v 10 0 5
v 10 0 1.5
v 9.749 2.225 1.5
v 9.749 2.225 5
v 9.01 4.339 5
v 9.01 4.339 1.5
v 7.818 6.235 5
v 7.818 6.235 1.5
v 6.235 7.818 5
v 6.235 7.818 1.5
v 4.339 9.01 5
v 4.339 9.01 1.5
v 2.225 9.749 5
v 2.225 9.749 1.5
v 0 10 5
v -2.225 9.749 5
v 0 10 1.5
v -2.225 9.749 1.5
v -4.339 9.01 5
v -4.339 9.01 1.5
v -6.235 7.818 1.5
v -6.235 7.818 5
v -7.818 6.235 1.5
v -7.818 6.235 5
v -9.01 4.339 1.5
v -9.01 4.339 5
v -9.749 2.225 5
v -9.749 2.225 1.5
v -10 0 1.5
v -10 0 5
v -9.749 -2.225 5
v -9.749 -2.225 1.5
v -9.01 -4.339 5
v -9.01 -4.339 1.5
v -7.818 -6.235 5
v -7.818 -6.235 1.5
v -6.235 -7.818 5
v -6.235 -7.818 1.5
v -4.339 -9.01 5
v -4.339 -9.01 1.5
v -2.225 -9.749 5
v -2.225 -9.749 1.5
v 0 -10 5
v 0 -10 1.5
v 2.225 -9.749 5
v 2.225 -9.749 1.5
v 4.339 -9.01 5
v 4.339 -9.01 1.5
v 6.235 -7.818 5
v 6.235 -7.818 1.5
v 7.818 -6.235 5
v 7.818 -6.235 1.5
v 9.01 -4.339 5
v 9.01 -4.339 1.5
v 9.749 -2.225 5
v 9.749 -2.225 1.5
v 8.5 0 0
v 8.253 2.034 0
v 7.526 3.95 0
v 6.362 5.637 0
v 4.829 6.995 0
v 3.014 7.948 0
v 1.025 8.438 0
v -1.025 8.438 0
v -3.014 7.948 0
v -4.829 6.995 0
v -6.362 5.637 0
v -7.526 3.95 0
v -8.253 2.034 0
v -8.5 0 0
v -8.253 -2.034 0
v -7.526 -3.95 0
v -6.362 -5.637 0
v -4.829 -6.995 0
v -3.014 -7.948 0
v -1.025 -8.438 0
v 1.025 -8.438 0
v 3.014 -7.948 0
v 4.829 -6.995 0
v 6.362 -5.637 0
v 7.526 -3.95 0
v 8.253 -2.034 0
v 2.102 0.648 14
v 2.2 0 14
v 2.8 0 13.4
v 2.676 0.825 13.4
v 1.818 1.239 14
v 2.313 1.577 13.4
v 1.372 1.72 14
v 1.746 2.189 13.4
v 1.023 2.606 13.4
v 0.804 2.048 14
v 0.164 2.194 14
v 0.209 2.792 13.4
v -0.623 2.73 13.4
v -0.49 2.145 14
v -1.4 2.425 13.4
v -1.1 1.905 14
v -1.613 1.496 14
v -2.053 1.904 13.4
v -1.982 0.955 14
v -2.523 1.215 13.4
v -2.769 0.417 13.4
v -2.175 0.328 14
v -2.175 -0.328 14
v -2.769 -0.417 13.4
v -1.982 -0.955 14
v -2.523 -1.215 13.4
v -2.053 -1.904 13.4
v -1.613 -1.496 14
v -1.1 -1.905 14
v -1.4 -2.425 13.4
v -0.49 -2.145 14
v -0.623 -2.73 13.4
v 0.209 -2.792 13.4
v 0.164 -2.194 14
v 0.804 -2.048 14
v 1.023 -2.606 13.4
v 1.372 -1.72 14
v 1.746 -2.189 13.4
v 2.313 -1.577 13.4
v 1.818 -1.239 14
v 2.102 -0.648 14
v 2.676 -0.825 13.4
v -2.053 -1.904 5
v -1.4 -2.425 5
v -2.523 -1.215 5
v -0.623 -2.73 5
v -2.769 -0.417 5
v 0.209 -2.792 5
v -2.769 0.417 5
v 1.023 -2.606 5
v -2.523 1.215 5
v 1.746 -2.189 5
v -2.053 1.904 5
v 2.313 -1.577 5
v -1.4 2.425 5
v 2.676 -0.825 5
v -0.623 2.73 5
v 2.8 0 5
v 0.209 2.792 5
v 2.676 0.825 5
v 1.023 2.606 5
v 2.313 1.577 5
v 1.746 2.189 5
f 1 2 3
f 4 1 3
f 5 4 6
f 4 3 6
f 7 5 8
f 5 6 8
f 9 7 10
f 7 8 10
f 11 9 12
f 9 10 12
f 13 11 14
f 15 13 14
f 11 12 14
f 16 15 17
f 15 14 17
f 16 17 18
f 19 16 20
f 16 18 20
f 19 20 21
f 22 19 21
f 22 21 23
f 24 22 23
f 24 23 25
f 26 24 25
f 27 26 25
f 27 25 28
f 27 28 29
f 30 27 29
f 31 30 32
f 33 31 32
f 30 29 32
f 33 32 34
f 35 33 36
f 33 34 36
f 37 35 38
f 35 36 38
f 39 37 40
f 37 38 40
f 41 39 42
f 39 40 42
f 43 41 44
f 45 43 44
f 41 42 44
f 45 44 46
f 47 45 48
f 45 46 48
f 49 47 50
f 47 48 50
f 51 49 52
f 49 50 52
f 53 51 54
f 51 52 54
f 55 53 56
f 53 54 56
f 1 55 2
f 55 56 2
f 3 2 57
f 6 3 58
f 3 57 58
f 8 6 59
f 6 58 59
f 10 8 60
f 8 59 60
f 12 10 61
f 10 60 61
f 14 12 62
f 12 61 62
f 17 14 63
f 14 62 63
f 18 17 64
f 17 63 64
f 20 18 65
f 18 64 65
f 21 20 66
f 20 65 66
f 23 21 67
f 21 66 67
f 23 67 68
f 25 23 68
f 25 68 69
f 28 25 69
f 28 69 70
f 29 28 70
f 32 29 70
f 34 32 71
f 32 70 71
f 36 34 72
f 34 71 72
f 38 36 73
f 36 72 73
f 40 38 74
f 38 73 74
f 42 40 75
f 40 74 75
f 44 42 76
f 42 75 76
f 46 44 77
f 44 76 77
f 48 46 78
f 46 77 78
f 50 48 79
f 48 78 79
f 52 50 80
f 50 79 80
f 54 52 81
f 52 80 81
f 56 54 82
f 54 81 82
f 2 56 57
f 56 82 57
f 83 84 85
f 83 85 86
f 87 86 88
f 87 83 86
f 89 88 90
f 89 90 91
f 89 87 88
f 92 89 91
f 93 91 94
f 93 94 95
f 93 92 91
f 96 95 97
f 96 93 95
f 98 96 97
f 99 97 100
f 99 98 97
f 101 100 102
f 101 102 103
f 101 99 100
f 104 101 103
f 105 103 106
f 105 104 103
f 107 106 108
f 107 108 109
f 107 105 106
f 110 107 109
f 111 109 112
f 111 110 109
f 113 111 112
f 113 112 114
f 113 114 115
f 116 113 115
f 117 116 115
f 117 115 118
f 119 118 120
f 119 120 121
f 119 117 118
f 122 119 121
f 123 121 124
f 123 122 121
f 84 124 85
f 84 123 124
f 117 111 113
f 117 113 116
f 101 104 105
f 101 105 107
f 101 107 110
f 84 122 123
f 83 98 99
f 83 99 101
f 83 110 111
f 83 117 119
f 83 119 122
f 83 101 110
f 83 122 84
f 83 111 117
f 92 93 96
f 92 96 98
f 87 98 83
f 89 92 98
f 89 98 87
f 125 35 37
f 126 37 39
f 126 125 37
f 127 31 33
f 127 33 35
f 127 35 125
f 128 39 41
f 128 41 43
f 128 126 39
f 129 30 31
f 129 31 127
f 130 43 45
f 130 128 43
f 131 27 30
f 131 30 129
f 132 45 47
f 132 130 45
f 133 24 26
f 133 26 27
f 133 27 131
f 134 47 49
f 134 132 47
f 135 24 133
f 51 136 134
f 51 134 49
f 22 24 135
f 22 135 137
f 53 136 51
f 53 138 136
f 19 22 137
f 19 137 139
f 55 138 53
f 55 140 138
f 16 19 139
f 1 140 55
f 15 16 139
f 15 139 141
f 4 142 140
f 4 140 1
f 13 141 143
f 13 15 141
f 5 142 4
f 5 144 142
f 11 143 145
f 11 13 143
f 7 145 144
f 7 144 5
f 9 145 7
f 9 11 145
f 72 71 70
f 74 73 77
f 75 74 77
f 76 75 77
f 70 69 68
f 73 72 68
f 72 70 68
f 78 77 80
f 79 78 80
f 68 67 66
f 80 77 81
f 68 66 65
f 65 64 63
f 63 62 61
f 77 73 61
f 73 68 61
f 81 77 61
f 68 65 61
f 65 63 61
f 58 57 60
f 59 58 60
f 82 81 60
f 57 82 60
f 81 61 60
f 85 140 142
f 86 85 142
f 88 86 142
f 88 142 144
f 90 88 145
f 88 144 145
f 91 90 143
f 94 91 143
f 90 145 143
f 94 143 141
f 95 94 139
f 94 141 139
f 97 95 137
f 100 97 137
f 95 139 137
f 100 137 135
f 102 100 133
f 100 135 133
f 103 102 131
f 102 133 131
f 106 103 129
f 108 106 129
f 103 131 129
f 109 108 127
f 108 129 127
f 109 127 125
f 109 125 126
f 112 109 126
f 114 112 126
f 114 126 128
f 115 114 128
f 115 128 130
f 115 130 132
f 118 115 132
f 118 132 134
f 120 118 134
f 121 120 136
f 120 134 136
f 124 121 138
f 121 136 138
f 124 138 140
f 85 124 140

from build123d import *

# Parameters (mm, degrees)
F0_R     = 10
F1_DEPTH = 5
F2_R     = 2.8
F3_DEPTH = 9
F4_SIZE  = 1.5
F5_SIZE  = 0.6


with BuildPart() as f1:
    # F0 (on Top) → F1 (new body)
    with BuildSketch(Plane.XY):
        Circle(F0_R)
    extrude(amount=F1_DEPTH)

    # F2 (on face) → F3 (join)
    with BuildSketch(Plane.XY.offset(5)):
        Circle(F2_R)
    extrude(amount=F3_DEPTH)

    # F4
    f4_edges = [f1.edges().sort_by_distance(p)[0] for p in [
        (-10, 0, 0),
    ]]
    chamfer(f4_edges, length=F4_SIZE)

    # F5
    f5_edges = [f1.edges().sort_by_distance(p)[0] for p in [
        (-2.8, 0, 14),
    ]]
    chamfer(f5_edges, length=F5_SIZE)


solid = f1.part
